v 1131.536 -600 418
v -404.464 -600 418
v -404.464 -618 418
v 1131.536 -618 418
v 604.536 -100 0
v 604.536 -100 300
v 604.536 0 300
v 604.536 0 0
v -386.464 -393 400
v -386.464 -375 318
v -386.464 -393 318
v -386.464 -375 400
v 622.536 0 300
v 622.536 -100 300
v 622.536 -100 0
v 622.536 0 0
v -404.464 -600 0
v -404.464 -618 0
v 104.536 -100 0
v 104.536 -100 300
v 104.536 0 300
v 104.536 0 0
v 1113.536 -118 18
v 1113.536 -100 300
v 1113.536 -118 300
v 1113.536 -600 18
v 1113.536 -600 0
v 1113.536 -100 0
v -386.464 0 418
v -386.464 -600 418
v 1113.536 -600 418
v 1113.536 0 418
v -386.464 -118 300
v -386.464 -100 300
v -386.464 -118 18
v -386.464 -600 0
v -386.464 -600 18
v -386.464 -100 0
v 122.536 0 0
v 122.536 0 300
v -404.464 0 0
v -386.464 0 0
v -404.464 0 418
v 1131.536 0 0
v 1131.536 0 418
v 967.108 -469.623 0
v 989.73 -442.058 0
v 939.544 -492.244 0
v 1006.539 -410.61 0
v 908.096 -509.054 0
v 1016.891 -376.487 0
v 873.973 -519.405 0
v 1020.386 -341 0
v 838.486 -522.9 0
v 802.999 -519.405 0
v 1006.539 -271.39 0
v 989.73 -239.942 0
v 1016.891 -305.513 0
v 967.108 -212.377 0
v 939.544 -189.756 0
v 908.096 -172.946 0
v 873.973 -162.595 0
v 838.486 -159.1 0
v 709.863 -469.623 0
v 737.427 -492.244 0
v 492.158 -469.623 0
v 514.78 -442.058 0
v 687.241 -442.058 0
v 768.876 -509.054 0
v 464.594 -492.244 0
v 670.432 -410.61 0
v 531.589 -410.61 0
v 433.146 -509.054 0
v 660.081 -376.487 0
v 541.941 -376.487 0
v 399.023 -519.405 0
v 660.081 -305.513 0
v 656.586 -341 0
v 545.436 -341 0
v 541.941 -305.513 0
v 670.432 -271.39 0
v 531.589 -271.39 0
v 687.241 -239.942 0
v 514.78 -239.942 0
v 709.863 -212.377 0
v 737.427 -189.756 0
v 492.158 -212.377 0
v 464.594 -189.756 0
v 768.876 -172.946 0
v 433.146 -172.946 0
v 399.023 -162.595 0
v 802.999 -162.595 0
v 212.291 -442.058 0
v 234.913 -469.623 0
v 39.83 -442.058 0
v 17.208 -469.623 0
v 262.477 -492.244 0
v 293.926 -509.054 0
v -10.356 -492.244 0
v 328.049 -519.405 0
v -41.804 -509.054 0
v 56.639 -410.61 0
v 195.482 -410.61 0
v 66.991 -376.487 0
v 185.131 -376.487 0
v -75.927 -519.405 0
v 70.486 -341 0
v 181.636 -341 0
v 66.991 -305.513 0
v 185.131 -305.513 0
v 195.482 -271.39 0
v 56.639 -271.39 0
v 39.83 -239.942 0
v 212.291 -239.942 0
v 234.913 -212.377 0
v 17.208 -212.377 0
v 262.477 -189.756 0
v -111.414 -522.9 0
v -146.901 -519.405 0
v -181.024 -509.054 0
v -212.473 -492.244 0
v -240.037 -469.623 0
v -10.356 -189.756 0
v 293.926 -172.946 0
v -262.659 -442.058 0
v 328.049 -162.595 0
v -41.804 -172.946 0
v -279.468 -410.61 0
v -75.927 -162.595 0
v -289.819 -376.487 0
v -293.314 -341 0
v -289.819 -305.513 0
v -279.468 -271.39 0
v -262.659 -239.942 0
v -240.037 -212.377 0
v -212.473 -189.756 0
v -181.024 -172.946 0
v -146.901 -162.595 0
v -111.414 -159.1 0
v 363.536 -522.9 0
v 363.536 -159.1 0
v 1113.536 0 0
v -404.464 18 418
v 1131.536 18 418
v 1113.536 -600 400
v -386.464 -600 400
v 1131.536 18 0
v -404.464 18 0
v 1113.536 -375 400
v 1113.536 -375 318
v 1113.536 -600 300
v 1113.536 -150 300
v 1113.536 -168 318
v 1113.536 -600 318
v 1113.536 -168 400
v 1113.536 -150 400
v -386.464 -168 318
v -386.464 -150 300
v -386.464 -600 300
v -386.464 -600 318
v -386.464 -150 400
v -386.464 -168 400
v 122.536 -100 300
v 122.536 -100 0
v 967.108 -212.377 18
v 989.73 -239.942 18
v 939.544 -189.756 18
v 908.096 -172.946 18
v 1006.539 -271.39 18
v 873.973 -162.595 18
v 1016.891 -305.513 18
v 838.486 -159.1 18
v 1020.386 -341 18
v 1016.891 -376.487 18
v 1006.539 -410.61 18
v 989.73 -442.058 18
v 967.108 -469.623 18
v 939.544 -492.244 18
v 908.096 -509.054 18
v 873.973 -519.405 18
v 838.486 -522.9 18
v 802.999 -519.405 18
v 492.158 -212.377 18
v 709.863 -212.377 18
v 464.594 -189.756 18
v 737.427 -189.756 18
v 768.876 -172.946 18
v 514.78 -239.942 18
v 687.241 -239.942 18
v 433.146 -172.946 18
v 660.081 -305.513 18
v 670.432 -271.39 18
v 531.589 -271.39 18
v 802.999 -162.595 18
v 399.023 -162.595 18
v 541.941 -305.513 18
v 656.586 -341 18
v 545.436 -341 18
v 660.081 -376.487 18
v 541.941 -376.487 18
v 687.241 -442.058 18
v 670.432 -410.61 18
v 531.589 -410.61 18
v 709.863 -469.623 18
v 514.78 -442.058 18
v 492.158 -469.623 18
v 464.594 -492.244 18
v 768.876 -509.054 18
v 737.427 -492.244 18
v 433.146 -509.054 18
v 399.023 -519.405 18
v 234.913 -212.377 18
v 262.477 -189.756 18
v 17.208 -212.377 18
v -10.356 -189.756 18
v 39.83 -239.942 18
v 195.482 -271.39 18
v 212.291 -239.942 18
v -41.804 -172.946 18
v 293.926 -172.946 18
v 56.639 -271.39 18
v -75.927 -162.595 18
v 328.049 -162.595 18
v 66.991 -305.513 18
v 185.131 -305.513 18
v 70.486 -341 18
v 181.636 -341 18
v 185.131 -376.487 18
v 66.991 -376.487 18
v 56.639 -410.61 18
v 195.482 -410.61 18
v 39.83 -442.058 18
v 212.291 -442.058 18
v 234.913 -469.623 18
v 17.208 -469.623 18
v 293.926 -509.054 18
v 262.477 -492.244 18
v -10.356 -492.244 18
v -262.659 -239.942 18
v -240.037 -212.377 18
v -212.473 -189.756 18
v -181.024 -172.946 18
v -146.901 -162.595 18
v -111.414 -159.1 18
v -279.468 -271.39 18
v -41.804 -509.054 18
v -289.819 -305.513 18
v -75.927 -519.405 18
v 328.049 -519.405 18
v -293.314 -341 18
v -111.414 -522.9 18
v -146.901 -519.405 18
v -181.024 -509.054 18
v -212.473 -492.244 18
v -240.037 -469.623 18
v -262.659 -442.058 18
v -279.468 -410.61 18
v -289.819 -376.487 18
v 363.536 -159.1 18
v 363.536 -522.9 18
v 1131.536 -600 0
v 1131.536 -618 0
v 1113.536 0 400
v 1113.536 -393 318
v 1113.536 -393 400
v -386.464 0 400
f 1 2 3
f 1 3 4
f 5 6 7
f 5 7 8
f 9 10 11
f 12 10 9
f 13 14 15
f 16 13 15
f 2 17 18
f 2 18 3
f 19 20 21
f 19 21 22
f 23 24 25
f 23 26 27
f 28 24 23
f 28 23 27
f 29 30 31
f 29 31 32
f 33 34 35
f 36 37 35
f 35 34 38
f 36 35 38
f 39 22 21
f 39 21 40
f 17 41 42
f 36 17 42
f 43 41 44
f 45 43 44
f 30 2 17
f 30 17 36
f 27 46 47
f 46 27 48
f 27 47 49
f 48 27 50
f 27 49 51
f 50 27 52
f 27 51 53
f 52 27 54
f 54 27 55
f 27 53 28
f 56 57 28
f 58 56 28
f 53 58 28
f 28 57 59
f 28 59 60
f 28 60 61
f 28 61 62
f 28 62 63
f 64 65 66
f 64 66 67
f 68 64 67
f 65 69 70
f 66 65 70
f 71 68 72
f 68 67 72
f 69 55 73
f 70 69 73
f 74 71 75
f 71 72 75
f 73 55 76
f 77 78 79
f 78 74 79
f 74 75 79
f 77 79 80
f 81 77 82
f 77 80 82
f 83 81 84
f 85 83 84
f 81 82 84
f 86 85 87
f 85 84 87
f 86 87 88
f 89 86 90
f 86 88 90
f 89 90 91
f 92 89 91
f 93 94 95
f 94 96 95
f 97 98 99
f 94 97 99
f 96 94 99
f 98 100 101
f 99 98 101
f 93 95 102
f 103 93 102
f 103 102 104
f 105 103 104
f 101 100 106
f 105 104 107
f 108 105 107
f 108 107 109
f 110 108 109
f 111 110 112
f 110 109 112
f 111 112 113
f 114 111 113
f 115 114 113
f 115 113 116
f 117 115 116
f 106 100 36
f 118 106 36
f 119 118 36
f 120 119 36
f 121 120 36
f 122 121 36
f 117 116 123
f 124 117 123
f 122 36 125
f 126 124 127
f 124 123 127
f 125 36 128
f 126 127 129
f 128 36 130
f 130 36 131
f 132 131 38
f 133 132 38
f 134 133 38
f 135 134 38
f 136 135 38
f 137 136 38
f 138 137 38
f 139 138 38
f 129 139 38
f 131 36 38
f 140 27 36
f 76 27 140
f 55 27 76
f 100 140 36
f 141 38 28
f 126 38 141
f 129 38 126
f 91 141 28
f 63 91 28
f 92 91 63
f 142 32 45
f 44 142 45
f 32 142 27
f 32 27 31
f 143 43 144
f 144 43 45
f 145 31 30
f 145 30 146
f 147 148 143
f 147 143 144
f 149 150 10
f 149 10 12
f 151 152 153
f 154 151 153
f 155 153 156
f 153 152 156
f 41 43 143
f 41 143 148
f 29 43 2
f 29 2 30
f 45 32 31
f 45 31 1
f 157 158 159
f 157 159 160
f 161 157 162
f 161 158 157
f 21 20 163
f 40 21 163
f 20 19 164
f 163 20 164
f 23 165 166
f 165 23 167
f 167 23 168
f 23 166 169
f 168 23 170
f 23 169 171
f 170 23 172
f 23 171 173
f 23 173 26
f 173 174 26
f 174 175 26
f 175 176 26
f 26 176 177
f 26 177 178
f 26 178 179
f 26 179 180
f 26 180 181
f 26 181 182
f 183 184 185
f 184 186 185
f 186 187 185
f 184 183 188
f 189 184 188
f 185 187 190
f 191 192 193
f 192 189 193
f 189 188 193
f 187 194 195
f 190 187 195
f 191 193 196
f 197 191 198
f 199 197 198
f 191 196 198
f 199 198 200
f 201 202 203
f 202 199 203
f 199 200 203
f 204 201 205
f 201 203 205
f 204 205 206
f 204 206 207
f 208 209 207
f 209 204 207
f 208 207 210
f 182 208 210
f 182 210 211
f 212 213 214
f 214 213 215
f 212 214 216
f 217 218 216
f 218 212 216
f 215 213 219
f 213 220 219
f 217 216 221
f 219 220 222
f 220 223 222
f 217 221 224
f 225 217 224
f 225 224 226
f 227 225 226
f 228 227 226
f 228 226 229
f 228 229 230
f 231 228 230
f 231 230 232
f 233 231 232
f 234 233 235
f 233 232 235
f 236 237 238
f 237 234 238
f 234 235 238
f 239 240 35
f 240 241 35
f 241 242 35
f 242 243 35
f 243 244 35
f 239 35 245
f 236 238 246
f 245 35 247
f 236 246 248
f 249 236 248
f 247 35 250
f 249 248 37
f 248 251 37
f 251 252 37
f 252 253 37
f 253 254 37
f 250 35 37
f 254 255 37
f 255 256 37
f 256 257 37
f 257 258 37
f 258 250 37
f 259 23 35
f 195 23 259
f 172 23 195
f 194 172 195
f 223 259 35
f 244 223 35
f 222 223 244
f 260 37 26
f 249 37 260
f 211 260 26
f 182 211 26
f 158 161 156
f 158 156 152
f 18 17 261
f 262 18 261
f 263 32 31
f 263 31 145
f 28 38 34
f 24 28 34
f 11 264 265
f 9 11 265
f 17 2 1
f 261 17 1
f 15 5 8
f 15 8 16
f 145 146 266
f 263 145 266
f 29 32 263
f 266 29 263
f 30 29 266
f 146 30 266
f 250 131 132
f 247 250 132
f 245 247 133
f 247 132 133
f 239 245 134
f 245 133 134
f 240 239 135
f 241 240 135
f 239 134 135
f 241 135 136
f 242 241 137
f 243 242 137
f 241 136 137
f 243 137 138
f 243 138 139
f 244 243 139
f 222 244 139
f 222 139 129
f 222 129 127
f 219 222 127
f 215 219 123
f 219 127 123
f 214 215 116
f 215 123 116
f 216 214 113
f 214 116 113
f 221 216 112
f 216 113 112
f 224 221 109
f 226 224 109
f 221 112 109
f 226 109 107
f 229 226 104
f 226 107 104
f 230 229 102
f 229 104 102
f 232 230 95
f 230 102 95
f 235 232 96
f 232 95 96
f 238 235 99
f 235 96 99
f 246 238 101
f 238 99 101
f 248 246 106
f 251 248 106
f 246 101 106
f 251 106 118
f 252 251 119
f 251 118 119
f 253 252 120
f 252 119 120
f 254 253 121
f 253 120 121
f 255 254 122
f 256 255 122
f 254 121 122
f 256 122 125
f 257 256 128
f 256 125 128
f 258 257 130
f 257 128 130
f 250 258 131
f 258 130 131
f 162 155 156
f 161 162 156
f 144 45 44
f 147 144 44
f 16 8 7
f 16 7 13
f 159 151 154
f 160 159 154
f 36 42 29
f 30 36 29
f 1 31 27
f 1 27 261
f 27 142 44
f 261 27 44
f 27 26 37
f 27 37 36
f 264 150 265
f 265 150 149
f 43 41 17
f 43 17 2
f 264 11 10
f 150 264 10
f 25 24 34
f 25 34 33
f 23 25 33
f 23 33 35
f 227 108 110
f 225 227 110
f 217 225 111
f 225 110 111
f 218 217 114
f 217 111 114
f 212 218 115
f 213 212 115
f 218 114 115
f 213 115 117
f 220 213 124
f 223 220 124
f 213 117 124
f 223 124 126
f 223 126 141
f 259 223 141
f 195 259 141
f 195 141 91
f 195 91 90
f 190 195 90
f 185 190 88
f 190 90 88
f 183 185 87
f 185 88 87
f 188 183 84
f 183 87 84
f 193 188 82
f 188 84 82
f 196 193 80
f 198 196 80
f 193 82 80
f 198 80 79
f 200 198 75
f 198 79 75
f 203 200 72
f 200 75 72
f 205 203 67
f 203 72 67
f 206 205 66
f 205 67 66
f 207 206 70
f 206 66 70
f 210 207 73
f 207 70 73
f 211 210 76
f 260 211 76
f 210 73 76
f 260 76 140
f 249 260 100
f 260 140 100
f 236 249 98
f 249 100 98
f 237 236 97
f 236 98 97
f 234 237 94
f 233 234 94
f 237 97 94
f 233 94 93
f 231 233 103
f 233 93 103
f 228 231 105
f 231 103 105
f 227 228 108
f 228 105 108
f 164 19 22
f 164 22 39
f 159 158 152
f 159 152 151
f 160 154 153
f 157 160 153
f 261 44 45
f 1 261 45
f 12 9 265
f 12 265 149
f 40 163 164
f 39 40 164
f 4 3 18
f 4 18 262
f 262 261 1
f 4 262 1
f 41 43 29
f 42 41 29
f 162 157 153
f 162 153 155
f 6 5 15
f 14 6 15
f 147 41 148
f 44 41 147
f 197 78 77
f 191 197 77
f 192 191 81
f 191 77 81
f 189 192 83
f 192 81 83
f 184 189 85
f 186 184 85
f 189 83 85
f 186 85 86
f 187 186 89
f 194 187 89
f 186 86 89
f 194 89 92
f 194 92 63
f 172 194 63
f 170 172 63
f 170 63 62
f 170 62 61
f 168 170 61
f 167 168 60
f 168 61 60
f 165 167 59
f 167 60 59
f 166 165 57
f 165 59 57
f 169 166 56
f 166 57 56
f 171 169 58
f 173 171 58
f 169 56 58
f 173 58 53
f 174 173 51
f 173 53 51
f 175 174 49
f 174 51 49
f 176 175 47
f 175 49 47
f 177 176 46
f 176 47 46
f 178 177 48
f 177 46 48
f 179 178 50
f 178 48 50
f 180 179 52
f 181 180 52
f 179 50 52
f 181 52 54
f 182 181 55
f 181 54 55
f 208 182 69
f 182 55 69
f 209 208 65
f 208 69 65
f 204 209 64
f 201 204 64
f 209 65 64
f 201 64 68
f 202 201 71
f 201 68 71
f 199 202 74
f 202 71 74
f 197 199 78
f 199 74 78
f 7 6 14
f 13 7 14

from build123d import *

# Parameters (mm, degrees)
ESQUISSE1_W             = 1536
ESQUISSE1_H             = 418
BOSS_EXTRU_1_DEPTH      = 18
ESQUISSE2_W             = 18
ESQUISSE2_H             = 418
EXTRU_MINCE3_DEPTH      = 600
ESQUISSE6_W             = 18
ESQUISSE6_H             = 418
EXTRU_MINCE4_DEPTH      = 600
ESQUISSE10_W            = 18
ESQUISSE10_H            = 600
EXTRU_MINCE5_DEPTH      = 1500
EXTRU_MINCE6_DEPTH      = 1500
ESQUISSE19_W            = 82
ESQUISSE19_H            = 18
BOSS_EXTRU_4_DEPTH      = 1500
EXTRU_MINCE7_DEPTH      = 1500
ESQUISSE13_R            = 181.9
ENL_V_MAT_EXTRU_1_DEPTH = 18
ESQUISSE14_W            = 1536
ESQUISSE14_H            = 418
BOSS_EXTRU_2_DEPTH      = 18
ESQUISSE16_W            = 18
ESQUISSE16_H            = 300
BOSS_EXTRU_3_DEPTH      = 100
BOSS_EXTRU_3_2_DEPTH    = 100


with BuildPart() as part:
    # Esquisse1 → Boss.-Extru.1 (new body)
    with BuildSketch(Plane(origin=(0, 0, 0), x_dir=(1, 0, 0), z_dir=(0, 1, 0))):
        with Locations((363.535714286, -209)):
            Rectangle(ESQUISSE1_W, ESQUISSE1_H)
    extrude(amount=BOSS_EXTRU_1_DEPTH)


with BuildPart() as body_2:
    # Esquisse2 → Extru.-Mince3 (new body)
    with BuildSketch(Plane.XZ):
        with Locations((1122.535714286, 209)):
            Rectangle(ESQUISSE2_W, ESQUISSE2_H)
    extrude(amount=EXTRU_MINCE3_DEPTH)


with BuildPart() as body_3:
    # Esquisse6 → Extru.-Mince4 (new body)
    with BuildSketch(Plane.XZ):
        with Locations((-395.464285714, 209)):
            Rectangle(ESQUISSE6_W, ESQUISSE6_H)
    extrude(amount=EXTRU_MINCE4_DEPTH)


with BuildPart() as body_4:
    # Esquisse10 → Extru.-Mince5 (new body)
    with BuildSketch(Plane(origin=(-386.464285714, 0, 0), x_dir=(0, 0, -1), z_dir=(1, 0, 0))):
        with Locations((-409, -300)):
            Rectangle(ESQUISSE10_W, ESQUISSE10_H)
    extrude(amount=EXTRU_MINCE5_DEPTH)


with BuildPart() as body_5:
    # Esquisse11 → Extru.-Mince6 (new body)
    with BuildSketch(Plane(origin=(-386.464285714, 0, 0), x_dir=(0, 0, -1), z_dir=(1, 0, 0))):
        Polygon((-400, -150), (-300, -150), (-300, -600), (-318, -600), (-318, -168), (-400, -168), align=None)
    extrude(amount=EXTRU_MINCE6_DEPTH)


with BuildPart() as body_6:
    # Esquisse19 → Boss.-Extru.4 (new body)
    with BuildSketch(Plane.ZY.offset(-1113.535714286)):
        with Locations((359, -384)):
            Rectangle(ESQUISSE19_W, ESQUISSE19_H)
    extrude(amount=BOSS_EXTRU_4_DEPTH)


with BuildPart() as body_7:
    # Esquisse12 → Extru.-Mince7 (new body)
    with BuildSketch(Plane(origin=(-386.464285714, 0, 0), x_dir=(0, 0, -1), z_dir=(1, 0, 0))):
        Polygon((0, -600), (0, -100), (-300, -100), (-300, -118), (-18, -118), (-18, -600), align=None)
    extrude(amount=EXTRU_MINCE7_DEPTH)

    # Esquisse13 → Enlèv. mat.-Extru.1 (cut)
    with BuildSketch(Plane(origin=(0, 0, 0), x_dir=(-1, 0, 0), z_dir=(0, 0, -1))):
        with Locations((-363.535714286, -341)):
            Circle(ESQUISSE13_R)
        with Locations((111.414285714, -341)):
            Circle(ESQUISSE13_R)
        with Locations((-838.485714286, -341)):
            Circle(ESQUISSE13_R)
    extrude(amount=-ENL_V_MAT_EXTRU_1_DEPTH, mode=Mode.SUBTRACT)


with BuildPart() as body_8:
    # Esquisse14 → Boss.-Extru.2 (new body)
    with BuildSketch(Plane.XZ.offset(600)):
        with Locations((363.535714286, 209)):
            Rectangle(ESQUISSE14_W, ESQUISSE14_H)
    extrude(amount=BOSS_EXTRU_2_DEPTH)


with BuildPart() as body_9:
    # Esquisse16 → Boss.-Extru.3 (new body)
    with BuildSketch(Plane(origin=(0, -100, 0), x_dir=(1, 0, 0), z_dir=(0, 1, 0))):
        with Locations((113.535714286, -150)):
            Rectangle(ESQUISSE16_W, ESQUISSE16_H)
    extrude(amount=BOSS_EXTRU_3_DEPTH)


with BuildPart() as body_10:
    # Esquisse16 → Boss.-Extru.3 2 (new body)
    with BuildSketch(Plane(origin=(0, -100, 0), x_dir=(1, 0, 0), z_dir=(0, 1, 0))):
        with Locations((613.535714286, -150)):
            Rectangle(ESQUISSE16_W, ESQUISSE16_H)
    extrude(amount=BOSS_EXTRU_3_2_DEPTH)


solid = Compound([part.part, body_2.part, body_3.part, body_4.part, body_5.part, body_6.part, body_7.part, body_8.part, body_9.part, body_10.part])
